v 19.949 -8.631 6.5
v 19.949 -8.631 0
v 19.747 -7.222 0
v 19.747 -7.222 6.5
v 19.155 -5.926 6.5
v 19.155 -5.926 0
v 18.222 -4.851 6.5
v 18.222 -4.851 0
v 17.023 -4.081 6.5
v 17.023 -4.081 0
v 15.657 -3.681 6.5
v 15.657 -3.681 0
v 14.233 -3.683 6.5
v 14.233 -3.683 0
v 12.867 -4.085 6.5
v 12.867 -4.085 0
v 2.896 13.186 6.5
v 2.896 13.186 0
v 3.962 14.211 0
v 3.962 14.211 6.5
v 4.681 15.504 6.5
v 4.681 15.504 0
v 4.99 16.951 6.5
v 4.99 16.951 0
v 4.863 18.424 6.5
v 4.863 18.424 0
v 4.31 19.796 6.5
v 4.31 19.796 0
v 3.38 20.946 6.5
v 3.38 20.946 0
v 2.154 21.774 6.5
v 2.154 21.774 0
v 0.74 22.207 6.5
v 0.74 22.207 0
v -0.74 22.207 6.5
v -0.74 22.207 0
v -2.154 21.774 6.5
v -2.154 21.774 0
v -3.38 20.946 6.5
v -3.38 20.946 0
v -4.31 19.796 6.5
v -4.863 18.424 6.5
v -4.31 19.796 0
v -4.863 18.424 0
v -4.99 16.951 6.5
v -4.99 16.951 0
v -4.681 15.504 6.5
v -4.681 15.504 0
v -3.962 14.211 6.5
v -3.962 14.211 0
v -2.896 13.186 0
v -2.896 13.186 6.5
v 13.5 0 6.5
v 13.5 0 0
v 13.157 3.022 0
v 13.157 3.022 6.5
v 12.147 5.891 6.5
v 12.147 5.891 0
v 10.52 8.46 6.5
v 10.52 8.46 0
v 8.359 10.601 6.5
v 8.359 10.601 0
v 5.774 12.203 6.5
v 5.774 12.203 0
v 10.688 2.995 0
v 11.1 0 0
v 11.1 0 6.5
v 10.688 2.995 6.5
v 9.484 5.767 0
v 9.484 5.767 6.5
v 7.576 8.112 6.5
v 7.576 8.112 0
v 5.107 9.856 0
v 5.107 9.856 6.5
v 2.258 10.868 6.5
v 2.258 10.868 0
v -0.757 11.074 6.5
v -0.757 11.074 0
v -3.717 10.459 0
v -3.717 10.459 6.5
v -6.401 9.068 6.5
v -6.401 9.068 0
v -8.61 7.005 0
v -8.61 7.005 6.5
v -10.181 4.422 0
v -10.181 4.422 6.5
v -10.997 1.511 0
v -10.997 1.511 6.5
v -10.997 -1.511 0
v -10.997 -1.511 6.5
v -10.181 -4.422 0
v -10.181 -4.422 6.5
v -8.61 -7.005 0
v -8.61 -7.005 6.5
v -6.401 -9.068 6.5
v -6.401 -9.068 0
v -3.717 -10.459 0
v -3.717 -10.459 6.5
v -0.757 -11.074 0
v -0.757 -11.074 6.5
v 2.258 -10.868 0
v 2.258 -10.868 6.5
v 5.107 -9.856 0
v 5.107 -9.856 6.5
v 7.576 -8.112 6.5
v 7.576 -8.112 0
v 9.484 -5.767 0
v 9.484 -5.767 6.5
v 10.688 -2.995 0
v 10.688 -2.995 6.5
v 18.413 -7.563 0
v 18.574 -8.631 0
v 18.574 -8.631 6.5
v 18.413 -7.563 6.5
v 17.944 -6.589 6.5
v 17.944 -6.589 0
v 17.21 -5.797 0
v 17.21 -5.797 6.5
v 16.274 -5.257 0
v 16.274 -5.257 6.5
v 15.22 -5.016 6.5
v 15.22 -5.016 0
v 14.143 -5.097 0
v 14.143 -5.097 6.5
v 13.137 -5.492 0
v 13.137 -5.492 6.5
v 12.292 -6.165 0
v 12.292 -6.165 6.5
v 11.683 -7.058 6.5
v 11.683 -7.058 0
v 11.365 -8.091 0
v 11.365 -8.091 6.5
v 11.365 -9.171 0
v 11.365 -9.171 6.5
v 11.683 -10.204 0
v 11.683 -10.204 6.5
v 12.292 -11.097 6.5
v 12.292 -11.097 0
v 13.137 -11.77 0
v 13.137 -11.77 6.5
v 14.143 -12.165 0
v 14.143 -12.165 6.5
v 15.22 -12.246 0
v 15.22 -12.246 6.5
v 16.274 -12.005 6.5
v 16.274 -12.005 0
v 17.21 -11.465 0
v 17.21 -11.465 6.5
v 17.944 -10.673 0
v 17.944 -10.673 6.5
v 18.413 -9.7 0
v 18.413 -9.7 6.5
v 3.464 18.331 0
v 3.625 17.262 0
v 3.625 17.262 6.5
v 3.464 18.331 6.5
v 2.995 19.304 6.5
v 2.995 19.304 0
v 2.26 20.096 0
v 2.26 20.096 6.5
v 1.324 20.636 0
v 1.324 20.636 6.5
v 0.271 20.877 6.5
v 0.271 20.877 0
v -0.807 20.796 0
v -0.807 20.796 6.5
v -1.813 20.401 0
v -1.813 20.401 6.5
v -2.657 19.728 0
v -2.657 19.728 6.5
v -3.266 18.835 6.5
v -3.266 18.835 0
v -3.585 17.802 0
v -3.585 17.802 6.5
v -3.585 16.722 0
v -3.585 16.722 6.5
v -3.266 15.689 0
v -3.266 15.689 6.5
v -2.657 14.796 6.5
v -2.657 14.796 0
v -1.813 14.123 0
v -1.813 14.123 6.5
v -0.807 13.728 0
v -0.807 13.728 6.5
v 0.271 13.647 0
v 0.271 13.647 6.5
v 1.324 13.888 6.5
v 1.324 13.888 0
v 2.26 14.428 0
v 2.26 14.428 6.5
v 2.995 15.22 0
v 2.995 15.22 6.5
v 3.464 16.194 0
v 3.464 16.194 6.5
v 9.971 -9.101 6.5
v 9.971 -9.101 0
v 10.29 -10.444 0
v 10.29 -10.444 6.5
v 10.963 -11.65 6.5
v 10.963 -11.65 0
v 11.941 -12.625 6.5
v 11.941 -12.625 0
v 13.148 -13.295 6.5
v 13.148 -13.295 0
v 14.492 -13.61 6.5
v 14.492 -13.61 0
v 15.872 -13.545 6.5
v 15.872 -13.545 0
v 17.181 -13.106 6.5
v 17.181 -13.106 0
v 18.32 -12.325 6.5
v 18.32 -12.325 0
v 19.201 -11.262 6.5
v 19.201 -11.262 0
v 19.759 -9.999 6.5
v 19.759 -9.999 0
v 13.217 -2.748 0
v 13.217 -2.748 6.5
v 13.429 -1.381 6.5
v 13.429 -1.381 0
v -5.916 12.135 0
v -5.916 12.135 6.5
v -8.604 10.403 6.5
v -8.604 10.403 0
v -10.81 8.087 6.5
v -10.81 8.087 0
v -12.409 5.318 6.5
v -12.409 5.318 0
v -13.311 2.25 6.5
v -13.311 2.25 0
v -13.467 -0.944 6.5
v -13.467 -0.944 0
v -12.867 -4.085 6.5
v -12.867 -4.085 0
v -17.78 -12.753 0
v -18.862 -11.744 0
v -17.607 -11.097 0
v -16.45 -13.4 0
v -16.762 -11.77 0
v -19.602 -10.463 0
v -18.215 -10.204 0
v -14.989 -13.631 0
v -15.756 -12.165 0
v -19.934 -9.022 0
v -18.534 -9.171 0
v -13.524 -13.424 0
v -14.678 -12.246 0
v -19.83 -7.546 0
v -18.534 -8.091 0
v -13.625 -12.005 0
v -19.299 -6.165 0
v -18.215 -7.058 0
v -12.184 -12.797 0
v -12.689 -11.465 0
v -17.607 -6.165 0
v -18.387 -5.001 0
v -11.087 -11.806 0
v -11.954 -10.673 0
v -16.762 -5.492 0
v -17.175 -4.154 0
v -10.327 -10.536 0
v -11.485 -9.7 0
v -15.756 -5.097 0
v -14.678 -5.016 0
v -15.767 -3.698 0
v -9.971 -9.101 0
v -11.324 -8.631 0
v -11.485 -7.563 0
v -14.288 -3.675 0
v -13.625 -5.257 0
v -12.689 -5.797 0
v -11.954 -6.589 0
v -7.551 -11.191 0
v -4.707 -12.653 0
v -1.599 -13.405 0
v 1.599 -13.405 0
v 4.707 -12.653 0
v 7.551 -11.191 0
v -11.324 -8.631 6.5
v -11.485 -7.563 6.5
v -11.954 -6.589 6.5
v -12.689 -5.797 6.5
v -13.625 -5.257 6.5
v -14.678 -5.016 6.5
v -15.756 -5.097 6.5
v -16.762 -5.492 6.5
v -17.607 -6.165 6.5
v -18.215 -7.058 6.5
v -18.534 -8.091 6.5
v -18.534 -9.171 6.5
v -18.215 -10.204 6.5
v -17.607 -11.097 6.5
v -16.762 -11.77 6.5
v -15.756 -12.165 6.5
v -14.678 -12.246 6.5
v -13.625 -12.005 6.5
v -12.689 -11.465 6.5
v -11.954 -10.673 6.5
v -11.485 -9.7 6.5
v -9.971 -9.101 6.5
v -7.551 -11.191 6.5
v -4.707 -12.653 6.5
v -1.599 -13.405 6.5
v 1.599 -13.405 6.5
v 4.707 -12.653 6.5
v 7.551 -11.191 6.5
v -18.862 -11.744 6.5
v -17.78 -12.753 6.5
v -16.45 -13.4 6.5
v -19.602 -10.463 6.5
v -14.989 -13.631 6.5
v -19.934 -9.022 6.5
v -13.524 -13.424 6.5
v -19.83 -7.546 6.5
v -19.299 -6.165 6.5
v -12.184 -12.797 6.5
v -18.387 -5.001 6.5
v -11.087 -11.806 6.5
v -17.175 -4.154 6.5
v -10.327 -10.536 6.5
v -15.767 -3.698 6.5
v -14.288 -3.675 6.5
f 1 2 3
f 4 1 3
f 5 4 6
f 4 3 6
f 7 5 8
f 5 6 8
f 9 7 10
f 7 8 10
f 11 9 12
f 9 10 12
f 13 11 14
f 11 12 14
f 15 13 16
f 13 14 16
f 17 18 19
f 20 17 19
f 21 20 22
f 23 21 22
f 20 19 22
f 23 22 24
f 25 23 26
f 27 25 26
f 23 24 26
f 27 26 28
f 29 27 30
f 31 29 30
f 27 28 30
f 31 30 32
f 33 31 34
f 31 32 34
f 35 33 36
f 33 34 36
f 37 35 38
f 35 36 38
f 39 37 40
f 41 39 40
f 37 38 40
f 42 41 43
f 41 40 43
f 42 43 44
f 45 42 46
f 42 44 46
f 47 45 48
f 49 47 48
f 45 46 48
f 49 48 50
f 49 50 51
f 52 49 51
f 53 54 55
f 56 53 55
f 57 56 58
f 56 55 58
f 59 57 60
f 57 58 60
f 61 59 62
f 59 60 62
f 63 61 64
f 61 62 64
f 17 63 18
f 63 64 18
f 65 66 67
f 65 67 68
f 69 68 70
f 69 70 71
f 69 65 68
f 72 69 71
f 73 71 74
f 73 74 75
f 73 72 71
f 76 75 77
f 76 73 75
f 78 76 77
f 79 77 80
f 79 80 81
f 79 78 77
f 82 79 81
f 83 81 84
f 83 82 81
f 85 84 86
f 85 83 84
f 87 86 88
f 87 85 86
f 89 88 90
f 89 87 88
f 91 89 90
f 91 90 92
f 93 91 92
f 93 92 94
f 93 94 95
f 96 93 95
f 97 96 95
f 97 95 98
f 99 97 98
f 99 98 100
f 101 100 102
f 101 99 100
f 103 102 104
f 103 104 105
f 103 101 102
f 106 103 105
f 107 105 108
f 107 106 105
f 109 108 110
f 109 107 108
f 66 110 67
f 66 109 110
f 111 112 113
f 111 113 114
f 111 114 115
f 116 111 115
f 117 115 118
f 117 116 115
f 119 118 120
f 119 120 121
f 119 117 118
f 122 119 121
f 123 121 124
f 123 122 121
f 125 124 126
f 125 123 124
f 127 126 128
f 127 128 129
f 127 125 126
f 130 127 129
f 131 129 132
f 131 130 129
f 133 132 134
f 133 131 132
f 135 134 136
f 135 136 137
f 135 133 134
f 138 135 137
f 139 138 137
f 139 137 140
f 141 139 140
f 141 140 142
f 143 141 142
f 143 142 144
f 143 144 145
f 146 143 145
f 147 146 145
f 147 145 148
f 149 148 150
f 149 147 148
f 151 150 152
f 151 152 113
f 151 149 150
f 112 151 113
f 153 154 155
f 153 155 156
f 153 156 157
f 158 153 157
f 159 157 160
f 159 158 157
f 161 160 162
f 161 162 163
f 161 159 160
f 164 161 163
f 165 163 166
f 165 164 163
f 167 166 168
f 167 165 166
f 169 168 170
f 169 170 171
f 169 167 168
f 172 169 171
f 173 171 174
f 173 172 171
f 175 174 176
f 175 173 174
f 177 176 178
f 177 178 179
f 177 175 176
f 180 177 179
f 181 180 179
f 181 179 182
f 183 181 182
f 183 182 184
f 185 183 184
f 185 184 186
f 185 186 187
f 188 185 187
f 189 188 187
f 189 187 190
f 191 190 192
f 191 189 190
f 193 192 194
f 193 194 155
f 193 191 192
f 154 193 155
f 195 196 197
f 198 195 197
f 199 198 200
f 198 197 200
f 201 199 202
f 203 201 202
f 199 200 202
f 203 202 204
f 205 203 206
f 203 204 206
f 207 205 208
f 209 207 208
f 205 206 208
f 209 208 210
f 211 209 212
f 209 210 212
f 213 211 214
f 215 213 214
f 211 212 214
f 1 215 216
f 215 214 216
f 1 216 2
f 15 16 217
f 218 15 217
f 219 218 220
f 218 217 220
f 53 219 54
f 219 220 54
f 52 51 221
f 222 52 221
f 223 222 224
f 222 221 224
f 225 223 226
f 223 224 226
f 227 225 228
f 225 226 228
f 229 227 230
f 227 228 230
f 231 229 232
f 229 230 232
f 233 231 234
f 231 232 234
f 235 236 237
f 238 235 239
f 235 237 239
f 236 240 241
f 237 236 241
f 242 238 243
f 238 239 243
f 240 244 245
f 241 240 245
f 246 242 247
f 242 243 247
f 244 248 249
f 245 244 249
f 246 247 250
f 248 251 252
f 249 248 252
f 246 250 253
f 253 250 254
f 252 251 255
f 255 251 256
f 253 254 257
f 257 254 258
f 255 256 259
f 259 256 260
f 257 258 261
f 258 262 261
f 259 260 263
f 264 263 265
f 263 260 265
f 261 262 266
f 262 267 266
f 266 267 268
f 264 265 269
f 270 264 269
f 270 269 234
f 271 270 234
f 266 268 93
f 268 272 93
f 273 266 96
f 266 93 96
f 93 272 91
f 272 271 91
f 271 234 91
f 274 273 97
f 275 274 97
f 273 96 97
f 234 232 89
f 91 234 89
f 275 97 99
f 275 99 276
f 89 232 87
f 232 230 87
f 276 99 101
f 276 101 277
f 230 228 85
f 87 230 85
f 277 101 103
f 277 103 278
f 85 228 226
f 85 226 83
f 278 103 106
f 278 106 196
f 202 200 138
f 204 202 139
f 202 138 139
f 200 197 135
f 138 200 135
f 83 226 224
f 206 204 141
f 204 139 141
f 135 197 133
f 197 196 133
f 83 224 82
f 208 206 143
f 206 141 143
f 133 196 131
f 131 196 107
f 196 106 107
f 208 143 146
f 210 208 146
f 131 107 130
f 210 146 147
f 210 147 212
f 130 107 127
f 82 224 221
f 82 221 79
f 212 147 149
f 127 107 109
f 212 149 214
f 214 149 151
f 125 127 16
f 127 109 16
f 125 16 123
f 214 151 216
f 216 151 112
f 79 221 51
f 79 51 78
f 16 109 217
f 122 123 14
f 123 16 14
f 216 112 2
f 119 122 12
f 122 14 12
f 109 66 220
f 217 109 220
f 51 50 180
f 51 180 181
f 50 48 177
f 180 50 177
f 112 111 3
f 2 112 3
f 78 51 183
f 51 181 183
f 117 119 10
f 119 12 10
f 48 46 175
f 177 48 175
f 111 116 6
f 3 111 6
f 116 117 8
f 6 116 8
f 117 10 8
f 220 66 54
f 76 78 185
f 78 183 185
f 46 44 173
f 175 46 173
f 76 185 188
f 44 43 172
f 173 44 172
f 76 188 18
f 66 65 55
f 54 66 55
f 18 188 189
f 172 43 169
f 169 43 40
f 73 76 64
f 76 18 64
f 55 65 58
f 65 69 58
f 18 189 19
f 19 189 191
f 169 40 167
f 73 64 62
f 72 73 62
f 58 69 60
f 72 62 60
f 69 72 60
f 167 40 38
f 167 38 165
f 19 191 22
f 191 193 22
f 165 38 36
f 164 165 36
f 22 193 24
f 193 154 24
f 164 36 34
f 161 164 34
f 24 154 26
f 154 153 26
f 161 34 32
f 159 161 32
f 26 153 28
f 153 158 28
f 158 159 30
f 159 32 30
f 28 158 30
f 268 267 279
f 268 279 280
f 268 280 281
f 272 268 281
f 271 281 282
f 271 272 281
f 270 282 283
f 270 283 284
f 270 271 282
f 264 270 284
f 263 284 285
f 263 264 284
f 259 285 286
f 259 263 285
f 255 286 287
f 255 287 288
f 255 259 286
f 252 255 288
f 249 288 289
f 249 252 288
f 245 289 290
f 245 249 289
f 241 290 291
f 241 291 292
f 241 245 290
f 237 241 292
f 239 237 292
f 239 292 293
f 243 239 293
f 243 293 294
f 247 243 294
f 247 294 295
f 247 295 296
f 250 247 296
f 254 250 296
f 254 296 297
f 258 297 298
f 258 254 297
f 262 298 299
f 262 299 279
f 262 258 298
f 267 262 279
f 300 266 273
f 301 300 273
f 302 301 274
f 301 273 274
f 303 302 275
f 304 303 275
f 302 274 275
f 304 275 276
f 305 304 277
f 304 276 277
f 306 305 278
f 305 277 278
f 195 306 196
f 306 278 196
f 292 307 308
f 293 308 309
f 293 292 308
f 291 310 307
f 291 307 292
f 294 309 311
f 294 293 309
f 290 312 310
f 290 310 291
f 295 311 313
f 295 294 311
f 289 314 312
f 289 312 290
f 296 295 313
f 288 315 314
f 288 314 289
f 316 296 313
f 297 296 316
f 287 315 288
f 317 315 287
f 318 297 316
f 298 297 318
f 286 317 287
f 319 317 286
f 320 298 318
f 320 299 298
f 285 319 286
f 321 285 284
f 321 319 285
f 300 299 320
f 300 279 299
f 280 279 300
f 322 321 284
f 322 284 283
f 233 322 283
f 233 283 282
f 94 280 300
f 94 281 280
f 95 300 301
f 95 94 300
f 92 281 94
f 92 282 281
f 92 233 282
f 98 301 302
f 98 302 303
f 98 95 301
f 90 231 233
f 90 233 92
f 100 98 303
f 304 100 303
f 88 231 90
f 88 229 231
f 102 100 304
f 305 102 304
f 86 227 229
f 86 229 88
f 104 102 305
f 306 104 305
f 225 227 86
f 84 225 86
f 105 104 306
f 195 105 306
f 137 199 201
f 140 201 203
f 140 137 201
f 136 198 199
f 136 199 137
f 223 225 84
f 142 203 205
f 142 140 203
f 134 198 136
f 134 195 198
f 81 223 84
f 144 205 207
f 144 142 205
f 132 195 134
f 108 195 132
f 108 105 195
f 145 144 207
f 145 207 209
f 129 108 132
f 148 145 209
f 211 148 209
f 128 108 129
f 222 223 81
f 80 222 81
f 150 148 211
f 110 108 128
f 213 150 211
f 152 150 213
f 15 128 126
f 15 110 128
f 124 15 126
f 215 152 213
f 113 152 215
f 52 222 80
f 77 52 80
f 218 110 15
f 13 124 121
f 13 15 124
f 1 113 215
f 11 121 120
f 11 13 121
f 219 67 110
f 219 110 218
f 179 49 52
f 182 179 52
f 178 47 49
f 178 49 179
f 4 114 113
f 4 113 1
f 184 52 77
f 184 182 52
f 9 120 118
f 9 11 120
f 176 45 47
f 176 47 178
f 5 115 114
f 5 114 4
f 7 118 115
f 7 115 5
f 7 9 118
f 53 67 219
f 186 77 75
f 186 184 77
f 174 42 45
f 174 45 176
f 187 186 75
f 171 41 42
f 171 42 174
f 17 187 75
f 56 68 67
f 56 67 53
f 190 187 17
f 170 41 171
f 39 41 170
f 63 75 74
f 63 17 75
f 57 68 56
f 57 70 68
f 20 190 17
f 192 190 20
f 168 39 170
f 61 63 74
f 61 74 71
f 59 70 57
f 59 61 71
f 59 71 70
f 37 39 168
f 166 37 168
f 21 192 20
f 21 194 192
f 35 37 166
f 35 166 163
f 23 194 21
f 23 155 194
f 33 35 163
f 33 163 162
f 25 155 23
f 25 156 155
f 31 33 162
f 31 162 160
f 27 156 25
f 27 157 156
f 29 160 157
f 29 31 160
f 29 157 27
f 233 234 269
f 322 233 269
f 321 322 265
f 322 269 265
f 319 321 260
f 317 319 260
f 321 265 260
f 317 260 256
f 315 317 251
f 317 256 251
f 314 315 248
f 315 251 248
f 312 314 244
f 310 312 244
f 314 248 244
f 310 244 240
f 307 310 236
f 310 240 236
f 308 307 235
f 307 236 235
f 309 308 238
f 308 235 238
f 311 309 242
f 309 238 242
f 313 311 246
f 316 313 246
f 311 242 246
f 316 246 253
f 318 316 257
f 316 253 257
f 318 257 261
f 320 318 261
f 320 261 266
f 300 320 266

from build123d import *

# Parameters (mm, degrees)
F0_R     = 3.625
F0_R_2   = 11.1
F1_DEPTH = 6.5


with BuildPart() as f1:
    # F0 (on Top) → F1 (new body)
    with BuildSketch(Plane.XY):
        with BuildLine():
            ThreePointArc((-2.8955630067, 13.1858149113), (0, 13.5), (2.8955630067, 13.1858149113))
            ThreePointArc((2.8955630067, 13.1858149113), (4.4428490315, 14.9683455961), (5, 17.2620527446))
            ThreePointArc((5, 17.2620527446), (-2.2937071485, 21.7049017761), (-2.8955630067, 13.1858149113))
        make_face()
        with Locations((0, 17.2620527446)):
            Circle(F0_R, mode=Mode.SUBTRACT)
        with BuildLine():
            ThreePointArc((19.9493761983, -8.6310263723), (17.6501427505, -4.4231931971), (12.8670321861, -4.0852763336))
            ThreePointArc((12.8670321861, -4.0852763336), (11.6913429511, -6.75), (9.9714691794, -9.1005385777))
            ThreePointArc((9.9714691794, -9.1005385777), (15.1843920546, -13.625500073), (19.9493761983, -8.6310263723))
        make_face()
        with Locations((14.9493761983, -8.6310263723)):
            Circle(F0_R, mode=Mode.SUBTRACT)
        with BuildLine():
            ThreePointArc((12.8670321861, -4.0852763336), (13.3408195871, -2.0670105814), (13.5, 0))
            ThreePointArc((13.5, 0), (10.519983379, 8.460493467), (2.8955630067, 13.1858149113))
            ThreePointArc((2.8955630067, 13.1858149113), (0, 12.2620527446), (-2.8955630067, 13.1858149113))
            ThreePointArc((-2.8955630067, 13.1858149113), (-11.6913429511, 6.75), (-12.8670321861, -4.0852763336))
            ThreePointArc((-12.8670321861, -4.0852763336), (-10.7415430231, -5.9302598201), (-9.9493761983, -8.6310263723))
            ThreePointArc((-9.9493761983, -8.6310263723), (-9.9549024976, -8.8660422286), (-9.9714691794, -9.1005385777))
            ThreePointArc((-9.9714691794, -9.1005385777), (0, -13.5), (9.9714691794, -9.1005385777))
            ThreePointArc((9.9714691794, -9.1005385777), (10.6192491794, -6.1310263723), (12.8670321861, -4.0852763336))
        make_face()
        Circle(F0_R_2, mode=Mode.SUBTRACT)
        with BuildLine():
            ThreePointArc((-9.9714691794, -9.1005385777), (-11.6913429511, -6.75), (-12.8670321861, -4.0852763336))
            ThreePointArc((-12.8670321861, -4.0852763336), (-19.2795032172, -11.1310263723), (-9.9714691794, -9.1005385777))
        make_face()
        with Locations((-14.9493761983, -8.6310263723)):
            Circle(F0_R, mode=Mode.SUBTRACT)
        with BuildLine():
            ThreePointArc((9.9714691794, -9.1005385777), (11.6913429511, -6.75), (12.8670321861, -4.0852763336))
            ThreePointArc((12.8670321861, -4.0852763336), (10.6192491794, -6.1310263723), (9.9714691794, -9.1005385777))
        make_face()
        with BuildLine():
            ThreePointArc((-2.8955630067, 13.1858149113), (0, 12.2620527446), (2.8955630067, 13.1858149113))
            ThreePointArc((2.8955630067, 13.1858149113), (0, 13.5), (-2.8955630067, 13.1858149113))
        make_face()
        with BuildLine():
            ThreePointArc((-9.9493761983, -8.6310263723), (-10.7415430231, -5.9302598201), (-12.8670321861, -4.0852763336))
            ThreePointArc((-12.8670321861, -4.0852763336), (-11.6913429511, -6.75), (-9.9714691794, -9.1005385777))
            ThreePointArc((-9.9714691794, -9.1005385777), (-9.9549024976, -8.8660422286), (-9.9493761983, -8.6310263723))
        make_face()
    extrude(amount=F1_DEPTH)


solid = f1.part
